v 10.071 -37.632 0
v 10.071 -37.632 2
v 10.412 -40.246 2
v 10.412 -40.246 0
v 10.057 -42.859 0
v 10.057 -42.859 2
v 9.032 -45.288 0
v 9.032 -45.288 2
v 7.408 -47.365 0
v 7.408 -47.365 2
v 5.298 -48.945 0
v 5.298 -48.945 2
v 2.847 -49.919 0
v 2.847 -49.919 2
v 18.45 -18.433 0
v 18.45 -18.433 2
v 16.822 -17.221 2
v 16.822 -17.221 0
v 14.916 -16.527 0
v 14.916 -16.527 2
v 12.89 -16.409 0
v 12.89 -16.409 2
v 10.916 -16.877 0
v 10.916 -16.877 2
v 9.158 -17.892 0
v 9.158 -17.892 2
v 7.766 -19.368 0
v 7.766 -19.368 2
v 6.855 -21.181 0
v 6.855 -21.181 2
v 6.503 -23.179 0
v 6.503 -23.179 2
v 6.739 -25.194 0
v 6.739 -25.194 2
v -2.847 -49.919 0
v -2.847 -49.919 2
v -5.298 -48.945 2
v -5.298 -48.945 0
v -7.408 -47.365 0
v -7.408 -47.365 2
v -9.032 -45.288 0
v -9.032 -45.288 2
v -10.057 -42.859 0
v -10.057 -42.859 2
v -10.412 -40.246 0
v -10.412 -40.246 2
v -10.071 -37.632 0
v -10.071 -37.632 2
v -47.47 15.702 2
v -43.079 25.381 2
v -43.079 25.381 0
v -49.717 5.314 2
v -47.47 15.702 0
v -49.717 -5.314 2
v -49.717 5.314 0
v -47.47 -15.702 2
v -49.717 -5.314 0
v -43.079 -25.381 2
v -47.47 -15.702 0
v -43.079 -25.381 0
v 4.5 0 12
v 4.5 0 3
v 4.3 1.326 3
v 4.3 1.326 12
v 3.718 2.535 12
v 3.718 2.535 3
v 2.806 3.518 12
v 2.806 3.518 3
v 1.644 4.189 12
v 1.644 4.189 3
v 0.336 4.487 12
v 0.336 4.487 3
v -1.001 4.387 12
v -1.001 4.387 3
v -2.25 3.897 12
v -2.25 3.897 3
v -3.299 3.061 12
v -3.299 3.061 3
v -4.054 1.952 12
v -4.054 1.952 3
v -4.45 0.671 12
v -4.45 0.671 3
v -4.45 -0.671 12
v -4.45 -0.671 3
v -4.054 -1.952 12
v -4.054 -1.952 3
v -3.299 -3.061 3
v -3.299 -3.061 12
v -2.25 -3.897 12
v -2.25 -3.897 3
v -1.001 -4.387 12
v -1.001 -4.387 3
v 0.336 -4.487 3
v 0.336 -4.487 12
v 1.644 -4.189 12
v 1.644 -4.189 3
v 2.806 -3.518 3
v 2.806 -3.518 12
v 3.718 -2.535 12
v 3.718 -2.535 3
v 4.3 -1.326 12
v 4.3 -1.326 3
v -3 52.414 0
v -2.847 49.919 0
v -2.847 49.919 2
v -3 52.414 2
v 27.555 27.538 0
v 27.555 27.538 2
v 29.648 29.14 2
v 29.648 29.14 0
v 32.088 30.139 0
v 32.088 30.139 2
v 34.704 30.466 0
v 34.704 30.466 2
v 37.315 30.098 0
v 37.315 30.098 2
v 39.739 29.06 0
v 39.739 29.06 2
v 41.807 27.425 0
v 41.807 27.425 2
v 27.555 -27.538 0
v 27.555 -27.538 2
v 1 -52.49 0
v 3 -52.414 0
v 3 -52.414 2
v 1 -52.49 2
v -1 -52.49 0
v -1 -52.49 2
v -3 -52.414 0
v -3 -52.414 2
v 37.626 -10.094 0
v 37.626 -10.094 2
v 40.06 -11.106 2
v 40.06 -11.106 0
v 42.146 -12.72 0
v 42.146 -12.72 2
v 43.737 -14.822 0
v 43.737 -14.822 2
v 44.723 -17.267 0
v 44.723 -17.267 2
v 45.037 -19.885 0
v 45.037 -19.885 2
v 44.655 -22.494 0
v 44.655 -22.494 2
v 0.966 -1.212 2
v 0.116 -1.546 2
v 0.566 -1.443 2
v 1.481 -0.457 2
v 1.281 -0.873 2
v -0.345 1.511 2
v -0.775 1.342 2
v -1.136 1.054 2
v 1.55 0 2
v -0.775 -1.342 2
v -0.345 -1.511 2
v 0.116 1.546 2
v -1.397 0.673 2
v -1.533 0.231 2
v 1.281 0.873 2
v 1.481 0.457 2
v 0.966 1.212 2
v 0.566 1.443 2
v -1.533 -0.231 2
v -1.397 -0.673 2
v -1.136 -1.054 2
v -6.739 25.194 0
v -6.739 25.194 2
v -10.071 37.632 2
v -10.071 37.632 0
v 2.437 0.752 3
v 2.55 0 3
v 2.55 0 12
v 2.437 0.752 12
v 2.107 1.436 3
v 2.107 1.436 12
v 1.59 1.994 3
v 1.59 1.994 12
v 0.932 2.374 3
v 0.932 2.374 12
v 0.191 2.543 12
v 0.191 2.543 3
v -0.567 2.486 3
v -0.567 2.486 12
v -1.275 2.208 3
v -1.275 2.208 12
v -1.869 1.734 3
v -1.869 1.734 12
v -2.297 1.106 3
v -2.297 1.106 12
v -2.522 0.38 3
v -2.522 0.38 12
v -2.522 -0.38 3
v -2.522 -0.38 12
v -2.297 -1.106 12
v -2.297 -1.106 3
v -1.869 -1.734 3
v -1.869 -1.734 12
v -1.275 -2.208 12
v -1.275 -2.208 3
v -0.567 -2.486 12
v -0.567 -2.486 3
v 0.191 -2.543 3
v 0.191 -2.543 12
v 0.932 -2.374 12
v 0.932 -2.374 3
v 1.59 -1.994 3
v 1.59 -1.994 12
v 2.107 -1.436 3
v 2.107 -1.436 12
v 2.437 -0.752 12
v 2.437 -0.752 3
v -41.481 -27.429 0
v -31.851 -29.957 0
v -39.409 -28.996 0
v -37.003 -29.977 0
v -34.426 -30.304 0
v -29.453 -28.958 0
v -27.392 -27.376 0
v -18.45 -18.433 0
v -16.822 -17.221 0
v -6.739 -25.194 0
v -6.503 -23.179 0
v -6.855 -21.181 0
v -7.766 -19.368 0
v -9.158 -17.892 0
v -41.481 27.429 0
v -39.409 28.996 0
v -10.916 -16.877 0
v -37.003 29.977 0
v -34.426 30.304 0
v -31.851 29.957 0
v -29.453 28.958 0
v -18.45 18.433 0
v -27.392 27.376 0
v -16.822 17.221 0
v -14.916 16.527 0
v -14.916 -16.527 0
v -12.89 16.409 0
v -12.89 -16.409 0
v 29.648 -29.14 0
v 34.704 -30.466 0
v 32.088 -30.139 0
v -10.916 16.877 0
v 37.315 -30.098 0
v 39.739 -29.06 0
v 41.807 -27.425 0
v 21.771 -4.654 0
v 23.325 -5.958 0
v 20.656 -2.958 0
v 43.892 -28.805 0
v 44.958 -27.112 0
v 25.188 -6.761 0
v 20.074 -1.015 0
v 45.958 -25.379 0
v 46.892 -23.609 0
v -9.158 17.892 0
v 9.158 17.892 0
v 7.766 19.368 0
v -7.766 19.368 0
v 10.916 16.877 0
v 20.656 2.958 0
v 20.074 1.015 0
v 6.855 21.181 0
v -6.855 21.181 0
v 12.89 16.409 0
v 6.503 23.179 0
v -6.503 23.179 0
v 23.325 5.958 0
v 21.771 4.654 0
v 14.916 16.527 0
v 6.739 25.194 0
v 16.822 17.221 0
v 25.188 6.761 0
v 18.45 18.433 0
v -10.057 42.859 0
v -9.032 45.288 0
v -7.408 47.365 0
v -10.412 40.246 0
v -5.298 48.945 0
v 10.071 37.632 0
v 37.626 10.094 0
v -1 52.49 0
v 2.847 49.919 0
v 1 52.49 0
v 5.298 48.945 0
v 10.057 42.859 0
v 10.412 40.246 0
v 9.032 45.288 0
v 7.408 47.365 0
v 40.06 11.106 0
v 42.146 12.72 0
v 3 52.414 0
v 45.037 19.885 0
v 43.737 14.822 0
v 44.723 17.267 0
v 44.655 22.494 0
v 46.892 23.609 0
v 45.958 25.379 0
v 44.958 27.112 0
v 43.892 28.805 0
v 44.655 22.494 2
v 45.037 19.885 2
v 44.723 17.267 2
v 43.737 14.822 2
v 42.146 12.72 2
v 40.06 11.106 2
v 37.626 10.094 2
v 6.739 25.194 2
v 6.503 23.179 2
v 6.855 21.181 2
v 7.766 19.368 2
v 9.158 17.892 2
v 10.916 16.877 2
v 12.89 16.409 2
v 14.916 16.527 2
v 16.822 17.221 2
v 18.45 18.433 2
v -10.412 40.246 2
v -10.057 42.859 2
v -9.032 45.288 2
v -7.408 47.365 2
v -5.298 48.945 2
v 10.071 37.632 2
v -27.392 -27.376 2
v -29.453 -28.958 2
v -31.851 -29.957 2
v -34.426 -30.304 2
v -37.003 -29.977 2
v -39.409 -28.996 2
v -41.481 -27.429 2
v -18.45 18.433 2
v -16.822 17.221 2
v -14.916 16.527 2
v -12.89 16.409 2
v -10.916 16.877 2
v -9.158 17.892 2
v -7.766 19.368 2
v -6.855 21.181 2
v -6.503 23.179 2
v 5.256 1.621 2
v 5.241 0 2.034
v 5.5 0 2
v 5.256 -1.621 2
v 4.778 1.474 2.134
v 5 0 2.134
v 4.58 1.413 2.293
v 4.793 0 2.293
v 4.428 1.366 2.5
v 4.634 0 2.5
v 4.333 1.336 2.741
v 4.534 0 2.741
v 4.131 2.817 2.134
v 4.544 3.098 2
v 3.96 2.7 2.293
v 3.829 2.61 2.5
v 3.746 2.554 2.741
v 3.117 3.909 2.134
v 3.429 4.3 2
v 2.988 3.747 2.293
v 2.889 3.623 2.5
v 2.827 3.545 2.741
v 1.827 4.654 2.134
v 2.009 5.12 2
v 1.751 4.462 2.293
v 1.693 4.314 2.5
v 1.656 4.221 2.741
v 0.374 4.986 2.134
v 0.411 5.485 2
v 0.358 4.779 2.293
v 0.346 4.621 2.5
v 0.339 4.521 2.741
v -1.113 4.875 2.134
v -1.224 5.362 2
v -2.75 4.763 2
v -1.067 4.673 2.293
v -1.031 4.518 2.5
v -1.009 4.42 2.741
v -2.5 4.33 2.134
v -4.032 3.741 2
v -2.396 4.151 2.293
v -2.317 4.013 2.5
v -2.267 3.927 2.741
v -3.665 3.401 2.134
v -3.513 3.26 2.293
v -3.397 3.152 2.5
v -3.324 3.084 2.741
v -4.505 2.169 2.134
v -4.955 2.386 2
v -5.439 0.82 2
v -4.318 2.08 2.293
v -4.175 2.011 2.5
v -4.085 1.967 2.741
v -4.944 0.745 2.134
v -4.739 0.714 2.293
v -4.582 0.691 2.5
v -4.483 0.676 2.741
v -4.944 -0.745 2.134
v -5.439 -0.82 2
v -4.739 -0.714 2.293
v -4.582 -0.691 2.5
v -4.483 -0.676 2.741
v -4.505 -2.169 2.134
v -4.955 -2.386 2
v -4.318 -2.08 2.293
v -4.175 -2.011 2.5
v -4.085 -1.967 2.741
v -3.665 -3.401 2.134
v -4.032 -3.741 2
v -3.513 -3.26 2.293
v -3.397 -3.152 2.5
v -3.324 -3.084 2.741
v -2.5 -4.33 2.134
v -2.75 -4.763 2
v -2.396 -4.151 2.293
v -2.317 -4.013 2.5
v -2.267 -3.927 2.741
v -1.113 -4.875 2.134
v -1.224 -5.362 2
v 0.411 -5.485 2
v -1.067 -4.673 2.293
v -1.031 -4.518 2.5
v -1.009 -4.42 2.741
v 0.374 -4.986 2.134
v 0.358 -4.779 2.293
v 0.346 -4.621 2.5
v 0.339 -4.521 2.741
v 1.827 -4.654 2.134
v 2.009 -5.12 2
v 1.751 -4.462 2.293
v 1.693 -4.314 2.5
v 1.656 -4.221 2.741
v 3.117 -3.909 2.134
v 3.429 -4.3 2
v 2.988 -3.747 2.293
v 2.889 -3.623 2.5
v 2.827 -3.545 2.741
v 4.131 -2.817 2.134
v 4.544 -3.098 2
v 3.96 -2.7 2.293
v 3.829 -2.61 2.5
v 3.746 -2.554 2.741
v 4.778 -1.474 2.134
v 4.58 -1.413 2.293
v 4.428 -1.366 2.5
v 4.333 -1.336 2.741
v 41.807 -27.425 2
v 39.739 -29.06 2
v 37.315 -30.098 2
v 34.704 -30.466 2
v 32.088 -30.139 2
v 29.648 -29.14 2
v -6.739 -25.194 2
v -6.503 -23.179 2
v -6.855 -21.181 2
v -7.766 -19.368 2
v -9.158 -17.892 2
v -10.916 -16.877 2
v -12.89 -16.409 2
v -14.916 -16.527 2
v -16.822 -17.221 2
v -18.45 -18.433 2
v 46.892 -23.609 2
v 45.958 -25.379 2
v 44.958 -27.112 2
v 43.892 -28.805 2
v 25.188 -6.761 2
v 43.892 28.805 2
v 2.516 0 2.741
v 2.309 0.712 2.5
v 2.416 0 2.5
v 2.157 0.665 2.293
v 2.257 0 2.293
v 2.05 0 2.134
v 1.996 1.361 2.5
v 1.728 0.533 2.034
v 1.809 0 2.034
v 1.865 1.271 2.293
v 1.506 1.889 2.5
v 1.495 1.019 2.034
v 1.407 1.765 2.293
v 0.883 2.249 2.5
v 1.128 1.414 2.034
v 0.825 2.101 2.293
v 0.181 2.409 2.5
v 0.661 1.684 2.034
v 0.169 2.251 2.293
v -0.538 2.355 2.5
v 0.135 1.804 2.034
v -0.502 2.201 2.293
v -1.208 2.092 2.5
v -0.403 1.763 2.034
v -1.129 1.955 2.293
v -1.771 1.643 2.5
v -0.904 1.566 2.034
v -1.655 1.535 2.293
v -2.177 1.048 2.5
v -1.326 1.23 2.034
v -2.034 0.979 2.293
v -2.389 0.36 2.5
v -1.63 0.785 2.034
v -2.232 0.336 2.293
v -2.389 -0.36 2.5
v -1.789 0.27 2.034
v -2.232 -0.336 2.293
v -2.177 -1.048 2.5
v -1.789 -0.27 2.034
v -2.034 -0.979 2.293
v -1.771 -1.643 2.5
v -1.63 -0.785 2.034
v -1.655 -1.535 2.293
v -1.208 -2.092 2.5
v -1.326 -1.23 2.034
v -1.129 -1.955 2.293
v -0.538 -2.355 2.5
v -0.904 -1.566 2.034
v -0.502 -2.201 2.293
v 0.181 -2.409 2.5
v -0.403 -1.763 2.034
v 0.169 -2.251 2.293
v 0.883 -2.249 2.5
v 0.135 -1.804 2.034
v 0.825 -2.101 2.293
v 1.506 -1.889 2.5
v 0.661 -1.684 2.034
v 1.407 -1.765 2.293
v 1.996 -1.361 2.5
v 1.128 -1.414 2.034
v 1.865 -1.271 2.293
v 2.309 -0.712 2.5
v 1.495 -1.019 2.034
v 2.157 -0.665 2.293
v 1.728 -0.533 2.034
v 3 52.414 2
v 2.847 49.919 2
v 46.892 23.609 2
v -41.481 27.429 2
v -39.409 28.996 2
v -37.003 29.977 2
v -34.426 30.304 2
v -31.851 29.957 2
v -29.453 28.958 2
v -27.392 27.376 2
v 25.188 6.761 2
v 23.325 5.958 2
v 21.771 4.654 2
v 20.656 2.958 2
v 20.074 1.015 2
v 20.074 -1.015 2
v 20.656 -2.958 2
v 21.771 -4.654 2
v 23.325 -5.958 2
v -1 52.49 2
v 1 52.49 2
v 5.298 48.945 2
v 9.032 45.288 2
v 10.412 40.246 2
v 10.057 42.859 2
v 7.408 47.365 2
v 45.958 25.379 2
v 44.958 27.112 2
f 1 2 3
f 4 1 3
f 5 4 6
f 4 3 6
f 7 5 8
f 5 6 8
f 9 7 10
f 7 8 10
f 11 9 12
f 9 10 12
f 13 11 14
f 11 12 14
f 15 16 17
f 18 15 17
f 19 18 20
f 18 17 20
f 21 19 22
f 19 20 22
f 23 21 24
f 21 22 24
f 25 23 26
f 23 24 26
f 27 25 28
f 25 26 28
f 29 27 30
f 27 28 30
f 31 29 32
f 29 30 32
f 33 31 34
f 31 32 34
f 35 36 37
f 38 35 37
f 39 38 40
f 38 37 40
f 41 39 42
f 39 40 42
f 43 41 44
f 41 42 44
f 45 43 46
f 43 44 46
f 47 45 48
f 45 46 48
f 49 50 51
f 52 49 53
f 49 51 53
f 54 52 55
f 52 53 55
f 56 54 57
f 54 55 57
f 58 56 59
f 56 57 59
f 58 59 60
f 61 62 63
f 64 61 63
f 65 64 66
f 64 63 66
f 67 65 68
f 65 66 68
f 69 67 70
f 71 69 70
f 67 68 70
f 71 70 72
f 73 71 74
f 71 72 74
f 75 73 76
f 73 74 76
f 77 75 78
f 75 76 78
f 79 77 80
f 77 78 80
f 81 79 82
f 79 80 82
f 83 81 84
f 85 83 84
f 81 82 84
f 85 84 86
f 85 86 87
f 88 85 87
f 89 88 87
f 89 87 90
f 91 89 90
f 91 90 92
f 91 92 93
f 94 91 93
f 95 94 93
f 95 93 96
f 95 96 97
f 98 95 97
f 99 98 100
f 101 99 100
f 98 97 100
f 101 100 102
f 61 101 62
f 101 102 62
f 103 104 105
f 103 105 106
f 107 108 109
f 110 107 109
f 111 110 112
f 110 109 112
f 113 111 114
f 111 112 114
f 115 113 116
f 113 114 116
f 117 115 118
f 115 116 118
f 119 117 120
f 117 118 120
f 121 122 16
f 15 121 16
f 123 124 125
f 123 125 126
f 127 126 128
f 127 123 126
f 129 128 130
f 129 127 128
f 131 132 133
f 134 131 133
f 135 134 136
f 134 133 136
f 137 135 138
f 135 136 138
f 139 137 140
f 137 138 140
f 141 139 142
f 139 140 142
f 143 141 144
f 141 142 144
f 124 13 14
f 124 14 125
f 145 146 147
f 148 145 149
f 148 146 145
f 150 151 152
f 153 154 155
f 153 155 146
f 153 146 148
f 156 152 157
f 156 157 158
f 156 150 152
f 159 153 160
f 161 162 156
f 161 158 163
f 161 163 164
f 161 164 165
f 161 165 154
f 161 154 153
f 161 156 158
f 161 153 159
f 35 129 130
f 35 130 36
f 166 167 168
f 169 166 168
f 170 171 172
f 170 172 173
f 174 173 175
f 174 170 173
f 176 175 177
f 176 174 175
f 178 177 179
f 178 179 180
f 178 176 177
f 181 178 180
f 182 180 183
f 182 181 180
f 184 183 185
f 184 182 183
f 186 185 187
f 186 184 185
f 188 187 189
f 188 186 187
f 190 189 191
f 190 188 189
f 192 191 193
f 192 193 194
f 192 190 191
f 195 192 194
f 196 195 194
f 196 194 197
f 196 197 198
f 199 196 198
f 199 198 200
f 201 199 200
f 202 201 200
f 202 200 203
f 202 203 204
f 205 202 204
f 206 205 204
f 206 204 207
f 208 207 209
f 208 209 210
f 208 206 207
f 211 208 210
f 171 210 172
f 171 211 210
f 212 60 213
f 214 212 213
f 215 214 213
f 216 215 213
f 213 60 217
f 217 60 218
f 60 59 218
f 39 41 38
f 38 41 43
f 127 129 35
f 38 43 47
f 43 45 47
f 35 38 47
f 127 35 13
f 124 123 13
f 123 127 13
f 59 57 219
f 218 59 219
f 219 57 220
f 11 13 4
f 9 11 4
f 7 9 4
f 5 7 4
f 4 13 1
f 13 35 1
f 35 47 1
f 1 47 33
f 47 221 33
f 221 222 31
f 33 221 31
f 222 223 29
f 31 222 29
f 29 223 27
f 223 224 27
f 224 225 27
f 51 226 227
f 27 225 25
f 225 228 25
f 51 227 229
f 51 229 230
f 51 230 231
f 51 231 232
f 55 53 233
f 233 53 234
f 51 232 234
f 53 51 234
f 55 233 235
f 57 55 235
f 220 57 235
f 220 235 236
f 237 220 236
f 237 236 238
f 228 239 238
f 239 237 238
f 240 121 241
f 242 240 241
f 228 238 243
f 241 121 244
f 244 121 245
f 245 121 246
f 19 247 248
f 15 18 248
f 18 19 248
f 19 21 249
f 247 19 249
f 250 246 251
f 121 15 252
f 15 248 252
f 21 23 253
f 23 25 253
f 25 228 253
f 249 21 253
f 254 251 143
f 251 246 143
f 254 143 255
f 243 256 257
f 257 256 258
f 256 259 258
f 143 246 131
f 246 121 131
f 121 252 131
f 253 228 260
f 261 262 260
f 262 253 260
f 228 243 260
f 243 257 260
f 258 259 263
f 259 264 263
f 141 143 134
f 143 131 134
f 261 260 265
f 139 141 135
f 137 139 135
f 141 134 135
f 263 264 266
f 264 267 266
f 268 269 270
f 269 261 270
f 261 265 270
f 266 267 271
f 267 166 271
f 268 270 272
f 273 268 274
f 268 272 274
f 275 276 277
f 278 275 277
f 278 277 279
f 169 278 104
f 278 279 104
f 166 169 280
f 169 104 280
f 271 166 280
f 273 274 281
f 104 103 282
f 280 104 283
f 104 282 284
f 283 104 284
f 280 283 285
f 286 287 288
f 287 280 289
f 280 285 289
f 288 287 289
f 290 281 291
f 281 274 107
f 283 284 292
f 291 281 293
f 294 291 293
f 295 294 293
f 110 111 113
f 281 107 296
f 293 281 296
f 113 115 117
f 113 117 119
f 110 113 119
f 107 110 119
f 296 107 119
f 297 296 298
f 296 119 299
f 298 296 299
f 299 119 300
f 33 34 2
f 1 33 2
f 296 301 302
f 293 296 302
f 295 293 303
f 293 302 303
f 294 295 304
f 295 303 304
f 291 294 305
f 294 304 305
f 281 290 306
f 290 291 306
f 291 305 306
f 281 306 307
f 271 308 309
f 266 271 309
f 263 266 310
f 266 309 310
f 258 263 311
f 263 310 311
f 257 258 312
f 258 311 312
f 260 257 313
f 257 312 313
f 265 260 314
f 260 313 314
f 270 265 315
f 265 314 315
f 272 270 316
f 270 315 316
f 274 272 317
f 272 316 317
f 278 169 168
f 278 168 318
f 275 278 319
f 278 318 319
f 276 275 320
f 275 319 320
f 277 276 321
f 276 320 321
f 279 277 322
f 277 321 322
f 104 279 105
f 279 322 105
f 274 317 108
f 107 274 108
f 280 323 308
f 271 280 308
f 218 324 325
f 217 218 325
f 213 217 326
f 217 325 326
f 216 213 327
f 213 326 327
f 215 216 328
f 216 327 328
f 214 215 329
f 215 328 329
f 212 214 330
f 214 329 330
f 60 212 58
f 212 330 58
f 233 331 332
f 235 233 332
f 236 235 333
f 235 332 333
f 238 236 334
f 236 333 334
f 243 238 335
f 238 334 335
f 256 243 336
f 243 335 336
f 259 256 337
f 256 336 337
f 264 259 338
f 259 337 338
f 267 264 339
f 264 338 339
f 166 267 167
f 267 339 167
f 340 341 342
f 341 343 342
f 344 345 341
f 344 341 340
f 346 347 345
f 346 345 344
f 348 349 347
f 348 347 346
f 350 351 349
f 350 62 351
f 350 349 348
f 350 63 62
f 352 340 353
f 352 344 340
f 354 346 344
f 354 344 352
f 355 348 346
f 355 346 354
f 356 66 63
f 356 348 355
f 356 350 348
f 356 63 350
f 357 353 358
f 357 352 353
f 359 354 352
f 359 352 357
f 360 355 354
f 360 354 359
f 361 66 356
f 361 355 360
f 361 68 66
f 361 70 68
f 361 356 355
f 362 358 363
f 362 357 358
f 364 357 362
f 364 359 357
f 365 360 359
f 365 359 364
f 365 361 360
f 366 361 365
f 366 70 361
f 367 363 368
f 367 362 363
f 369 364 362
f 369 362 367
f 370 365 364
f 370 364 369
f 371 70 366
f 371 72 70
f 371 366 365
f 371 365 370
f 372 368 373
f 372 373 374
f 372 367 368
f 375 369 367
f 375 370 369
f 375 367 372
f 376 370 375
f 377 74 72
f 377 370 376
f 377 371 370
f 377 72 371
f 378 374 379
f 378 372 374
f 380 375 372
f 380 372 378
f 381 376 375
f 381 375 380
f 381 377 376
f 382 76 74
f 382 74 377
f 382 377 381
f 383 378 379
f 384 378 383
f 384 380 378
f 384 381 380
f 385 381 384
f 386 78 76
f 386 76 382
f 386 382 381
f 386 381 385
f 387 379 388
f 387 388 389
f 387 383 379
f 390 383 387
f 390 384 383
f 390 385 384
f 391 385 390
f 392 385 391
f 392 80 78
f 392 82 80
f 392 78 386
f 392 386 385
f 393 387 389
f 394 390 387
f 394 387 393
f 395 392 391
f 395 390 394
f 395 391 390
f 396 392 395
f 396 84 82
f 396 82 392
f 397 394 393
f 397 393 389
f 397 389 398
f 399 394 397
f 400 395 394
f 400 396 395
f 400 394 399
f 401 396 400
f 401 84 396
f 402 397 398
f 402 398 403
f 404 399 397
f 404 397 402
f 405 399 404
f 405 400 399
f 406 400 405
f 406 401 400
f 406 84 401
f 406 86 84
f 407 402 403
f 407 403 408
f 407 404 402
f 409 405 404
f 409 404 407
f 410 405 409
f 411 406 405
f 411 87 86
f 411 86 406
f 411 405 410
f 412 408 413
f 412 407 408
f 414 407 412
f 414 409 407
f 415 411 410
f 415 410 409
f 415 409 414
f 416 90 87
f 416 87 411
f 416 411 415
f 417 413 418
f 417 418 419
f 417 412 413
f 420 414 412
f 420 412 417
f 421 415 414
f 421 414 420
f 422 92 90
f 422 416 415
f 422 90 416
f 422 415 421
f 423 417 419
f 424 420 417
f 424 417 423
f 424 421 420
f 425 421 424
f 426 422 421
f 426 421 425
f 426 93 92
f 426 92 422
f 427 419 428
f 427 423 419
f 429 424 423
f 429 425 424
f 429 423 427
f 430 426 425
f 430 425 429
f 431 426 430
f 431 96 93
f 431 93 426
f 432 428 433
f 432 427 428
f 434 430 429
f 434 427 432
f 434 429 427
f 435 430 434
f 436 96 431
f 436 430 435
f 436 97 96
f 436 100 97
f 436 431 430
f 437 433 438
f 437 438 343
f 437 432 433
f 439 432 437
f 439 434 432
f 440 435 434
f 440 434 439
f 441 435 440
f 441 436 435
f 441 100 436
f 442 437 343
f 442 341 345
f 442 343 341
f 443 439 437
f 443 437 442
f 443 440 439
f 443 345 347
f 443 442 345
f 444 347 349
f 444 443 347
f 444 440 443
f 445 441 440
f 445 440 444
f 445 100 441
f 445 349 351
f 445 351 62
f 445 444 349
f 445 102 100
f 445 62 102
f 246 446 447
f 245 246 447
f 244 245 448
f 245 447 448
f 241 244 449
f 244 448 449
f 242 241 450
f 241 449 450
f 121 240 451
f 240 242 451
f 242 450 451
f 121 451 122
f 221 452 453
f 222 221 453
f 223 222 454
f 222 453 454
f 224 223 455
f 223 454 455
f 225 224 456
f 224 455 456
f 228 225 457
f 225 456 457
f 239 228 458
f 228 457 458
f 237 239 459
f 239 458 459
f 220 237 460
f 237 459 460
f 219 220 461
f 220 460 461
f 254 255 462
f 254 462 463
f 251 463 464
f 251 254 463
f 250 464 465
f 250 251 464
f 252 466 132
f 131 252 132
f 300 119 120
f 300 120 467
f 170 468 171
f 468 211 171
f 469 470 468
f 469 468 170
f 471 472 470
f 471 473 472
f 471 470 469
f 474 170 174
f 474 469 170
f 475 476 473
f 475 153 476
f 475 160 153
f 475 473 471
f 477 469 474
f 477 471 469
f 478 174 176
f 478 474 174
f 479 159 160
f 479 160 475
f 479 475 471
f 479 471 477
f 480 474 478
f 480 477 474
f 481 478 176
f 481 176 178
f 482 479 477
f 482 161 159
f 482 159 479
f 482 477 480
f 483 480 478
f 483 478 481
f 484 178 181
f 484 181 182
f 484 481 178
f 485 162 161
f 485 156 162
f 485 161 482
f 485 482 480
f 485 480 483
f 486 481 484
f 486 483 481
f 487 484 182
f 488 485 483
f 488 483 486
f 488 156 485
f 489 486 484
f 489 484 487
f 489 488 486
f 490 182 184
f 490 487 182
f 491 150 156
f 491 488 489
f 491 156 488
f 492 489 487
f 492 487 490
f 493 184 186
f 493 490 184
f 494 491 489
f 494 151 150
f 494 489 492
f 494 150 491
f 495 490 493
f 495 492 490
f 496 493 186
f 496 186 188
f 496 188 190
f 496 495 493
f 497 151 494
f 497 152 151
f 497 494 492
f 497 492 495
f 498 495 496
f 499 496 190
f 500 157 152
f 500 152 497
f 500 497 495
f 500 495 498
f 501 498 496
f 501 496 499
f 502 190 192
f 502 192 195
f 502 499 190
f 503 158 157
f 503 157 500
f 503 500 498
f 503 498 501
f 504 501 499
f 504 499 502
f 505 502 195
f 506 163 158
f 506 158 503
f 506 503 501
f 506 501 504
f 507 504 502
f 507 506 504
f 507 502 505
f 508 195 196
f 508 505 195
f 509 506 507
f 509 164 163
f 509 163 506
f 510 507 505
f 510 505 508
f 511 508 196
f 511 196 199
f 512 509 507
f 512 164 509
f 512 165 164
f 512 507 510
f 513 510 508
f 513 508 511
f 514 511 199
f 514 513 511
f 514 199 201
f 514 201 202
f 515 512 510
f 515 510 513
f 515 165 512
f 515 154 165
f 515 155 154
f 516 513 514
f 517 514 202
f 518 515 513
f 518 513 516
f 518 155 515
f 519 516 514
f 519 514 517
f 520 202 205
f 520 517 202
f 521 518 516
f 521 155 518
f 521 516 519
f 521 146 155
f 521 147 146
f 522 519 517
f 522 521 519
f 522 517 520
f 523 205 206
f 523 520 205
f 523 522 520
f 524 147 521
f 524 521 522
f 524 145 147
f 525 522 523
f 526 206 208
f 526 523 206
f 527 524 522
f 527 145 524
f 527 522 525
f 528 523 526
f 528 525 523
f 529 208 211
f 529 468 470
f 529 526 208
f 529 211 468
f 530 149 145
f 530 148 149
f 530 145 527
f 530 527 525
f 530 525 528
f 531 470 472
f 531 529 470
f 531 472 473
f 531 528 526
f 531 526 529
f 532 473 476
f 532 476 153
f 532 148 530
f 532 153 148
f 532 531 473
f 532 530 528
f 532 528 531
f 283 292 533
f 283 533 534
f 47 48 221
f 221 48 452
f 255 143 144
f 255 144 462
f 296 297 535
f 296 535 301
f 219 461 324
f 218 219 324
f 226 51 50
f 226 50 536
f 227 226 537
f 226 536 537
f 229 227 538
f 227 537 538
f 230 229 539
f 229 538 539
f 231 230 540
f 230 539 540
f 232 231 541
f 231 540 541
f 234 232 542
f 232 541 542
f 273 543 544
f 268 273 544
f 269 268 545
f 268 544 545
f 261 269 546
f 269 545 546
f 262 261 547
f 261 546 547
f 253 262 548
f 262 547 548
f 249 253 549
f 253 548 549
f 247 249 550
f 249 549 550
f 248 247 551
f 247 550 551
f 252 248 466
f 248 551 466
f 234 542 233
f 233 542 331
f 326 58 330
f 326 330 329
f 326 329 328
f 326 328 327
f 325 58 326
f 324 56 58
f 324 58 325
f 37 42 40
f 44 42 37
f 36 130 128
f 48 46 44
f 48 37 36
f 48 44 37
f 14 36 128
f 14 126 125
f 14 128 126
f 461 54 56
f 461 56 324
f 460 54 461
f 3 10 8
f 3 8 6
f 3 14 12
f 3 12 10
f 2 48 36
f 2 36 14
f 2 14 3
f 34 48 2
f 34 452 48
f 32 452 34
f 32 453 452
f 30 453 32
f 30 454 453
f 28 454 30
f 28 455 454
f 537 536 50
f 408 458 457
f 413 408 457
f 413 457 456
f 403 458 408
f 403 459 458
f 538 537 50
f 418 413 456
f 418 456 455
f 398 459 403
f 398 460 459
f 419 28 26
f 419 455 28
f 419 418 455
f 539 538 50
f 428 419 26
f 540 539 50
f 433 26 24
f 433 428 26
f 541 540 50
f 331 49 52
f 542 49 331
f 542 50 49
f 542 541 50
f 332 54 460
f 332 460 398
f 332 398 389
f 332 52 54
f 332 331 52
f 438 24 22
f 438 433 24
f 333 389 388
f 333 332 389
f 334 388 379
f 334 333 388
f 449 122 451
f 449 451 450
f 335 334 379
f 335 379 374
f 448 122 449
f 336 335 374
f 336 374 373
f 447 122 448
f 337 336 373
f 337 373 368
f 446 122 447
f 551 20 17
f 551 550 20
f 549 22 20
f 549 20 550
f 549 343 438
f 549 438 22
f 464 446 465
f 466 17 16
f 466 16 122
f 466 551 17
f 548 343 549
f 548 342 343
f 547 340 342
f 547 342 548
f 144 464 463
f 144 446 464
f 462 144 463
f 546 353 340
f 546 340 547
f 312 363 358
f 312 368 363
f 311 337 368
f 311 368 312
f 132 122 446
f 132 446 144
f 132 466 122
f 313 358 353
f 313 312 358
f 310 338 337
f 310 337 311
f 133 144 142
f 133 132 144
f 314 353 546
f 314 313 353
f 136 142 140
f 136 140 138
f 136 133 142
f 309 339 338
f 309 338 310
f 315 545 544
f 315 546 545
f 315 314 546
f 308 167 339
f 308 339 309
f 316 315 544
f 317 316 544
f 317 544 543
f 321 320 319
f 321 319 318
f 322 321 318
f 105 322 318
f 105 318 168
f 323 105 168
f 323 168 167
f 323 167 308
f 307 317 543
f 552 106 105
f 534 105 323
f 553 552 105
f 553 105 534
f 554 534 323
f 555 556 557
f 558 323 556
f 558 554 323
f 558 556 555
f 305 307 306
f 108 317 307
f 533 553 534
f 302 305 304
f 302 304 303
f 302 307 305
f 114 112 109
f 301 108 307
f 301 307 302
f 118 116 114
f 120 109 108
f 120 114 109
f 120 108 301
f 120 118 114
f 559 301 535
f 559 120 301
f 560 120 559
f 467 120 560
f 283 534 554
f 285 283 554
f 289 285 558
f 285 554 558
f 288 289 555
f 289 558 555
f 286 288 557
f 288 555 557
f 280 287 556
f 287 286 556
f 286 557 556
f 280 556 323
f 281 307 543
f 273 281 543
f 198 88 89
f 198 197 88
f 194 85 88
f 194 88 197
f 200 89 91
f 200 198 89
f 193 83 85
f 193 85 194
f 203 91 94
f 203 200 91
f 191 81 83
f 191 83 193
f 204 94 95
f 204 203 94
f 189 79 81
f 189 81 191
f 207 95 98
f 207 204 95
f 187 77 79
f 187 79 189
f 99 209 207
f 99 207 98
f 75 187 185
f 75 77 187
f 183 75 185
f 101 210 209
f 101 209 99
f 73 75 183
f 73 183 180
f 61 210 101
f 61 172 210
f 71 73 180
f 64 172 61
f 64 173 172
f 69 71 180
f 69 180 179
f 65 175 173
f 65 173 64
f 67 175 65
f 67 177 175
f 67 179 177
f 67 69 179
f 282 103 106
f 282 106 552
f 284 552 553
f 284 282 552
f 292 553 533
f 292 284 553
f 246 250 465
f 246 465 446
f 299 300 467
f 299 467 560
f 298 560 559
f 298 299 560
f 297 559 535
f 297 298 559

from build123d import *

# Parameters (mm, degrees)
SKETCH1_R                       = 50
BOSS_EXTRUDE1_DEPTH             = 2
BOSS_EXTRUDE3_START             = -2
BOSS_EXTRUDE3_DEPTH             = 2
SKETCH4_R                       = 4.5
SKETCH4_R_2                     = 2.55
BOSS_EXTRUDE2_DEPTH             = 10
CIRPATTERN2_COUNT               = 4
CIRPATTERN2_ANGLE               = 180
CUT_EXTRUDE2_REACH              = 75.186
CIRPATTERN3_COUNT               = 3
CIRPATTERN3_ANGLE               = 120
CIRPATTERN3_THE_OTHER_WAY_COUNT = 3
CIRPATTERN3_THE_OTHER_WAY_ANGLE = 120
FILLET1_R                       = 10
FILLET2_R                       = 1


with BuildPart() as part:
    # Sketch1 → Boss-Extrude1 (new body)
    with BuildSketch(Plane.XY):
        Circle(SKETCH1_R)
    extrude(amount=BOSS_EXTRUDE1_DEPTH)

    # Sketch5 → Boss-Extrude3 (add)
    with BuildSketch(Plane.XY.offset(2).offset(BOSS_EXTRUDE3_START)):
        with BuildLine():
            Line((-2.847377425, 49.918858579), (-3, 52.414215629))
            ThreePointArc((-3, 52.414215629), (0, 52.5), (3, 52.414215629))
            Line((3, 52.414215629), (2.847377425, 49.918858579))
            ThreePointArc((2.847377425, 49.918858579), (0, 50), (-2.847377425, 49.918858579))
        make_face()
    boss_extrude3 = extrude(amount=BOSS_EXTRUDE3_DEPTH)

    # Sketch4 → Boss-Extrude2 (add)
    with BuildSketch(Plane.XY.offset(2)):
        Circle(SKETCH4_R)
        Circle(SKETCH4_R_2, mode=Mode.SUBTRACT)
    extrude(amount=BOSS_EXTRUDE2_DEPTH)

    # CirPattern2: Boss-Extrude3 ×4 about axis
    cirpattern2_axis = Axis((0, 0, 0), (0, 0, -1))
    for i in range(1, CIRPATTERN2_COUNT):
        add(boss_extrude3.rotate(cirpattern2_axis, i * CIRPATTERN2_ANGLE / (CIRPATTERN2_COUNT - 1)))

    # Sketch7 → Cut-Extrude2 (cut, up to next)
    with BuildSketch(Plane.XY.offset(2), mode=Mode.PRIVATE) as cut_extrude2_sk1:
        with BuildLine():
            Line((48.293213683, 12.952432674), (25.188266684, 6.761480784))
            ThreePointArc((25.188266684, 6.761480784), (20, 0), (25.188266684, -6.761480784))
            Line((25.188266684, -6.761480784), (48.293213683, -12.952432674))
            ThreePointArc((48.293213683, -12.952432674), (50, 0), (48.293213683, 12.952432674))
        make_face()
    cut_extrude2_tool1 = extrude(cut_extrude2_sk1.sketch, amount=-CUT_EXTRUDE2_REACH, mode=Mode.PRIVATE) & part.part
    cut_extrude2 = cut_extrude2_tool1.solids().sort_by_distance((37.115477, 0, 2))[0]
    add(cut_extrude2, mode=Mode.SUBTRACT)

    # CirPattern3: Cut-Extrude2 ×3 about axis
    cirpattern3_axis = Axis((0, 0, 0), (0, 0, 1))
    for i in range(1, CIRPATTERN3_COUNT):
        add(cut_extrude2.rotate(cirpattern3_axis, i * CIRPATTERN3_ANGLE / (CIRPATTERN3_COUNT - 1)), mode=Mode.SUBTRACT)

    # CirPattern3 the other way: Cut-Extrude2 ×3 about axis
    cirpattern3_the_other_way_axis = Axis((0, 0, 0), (0, 0, -1))
    for i in range(1, CIRPATTERN3_THE_OTHER_WAY_COUNT):
        add(cut_extrude2.rotate(cirpattern3_the_other_way_axis, i * CIRPATTERN3_THE_OTHER_WAY_ANGLE / (CIRPATTERN3_THE_OTHER_WAY_COUNT - 1)), mode=Mode.SUBTRACT)

    # Fillet1
    # the kernel refuses this fillet: 10 mm, written as the material it takes off along each edge
    with BuildSketch(Plane(origin=(-35.363742578, 35.346933543, 33.509652434), x_dir=(-0.6121571340688006, -0.7907361400673886, 0), z_dir=(0, 0, -1))) as fillet1_piece_1:
        with BuildLine():
            CenterArc((11.343474876, -9.920253368), FILLET1_R, 82.759261871, 104.49509636)
            Line((1.423521402, -11.182997629), (1.225122333, -11.208252514))
            Line((1.225122333, -11.208252514), (-0.198399069, -0.025254885))
            Line((-0.198399069, -0.025254885), (-0.025207722, 0.198405067))
            ThreePointArc((-0.025207722, 0.198405067), (6.301930487, 0.59873316), (12.629068696, 0.198405067))
            Line((12.629068696, 0.198405067), (12.603860974, 0))
        make_face()
    extrude(amount=65.019304869, mode=Mode.SUBTRACT)
    with BuildSketch(Plane(origin=(-12.929471105, 48.299366217, 29.609711649), x_dir=(0.9873433189599674, 0.15859751103064706, 0), z_dir=(0, 0, -1))) as fillet1_piece_2:
        with BuildLine():
            CenterArc((11.077824317, 9.96238911), FILLET1_R, 174.125500121, 90.903649981)
            Line((1.130339641, 10.985887341), (0.931389948, 11.006357306))
            Line((0.931389948, 11.006357306), (-0.198949694, 0.020469965))
            Line((-0.198949694, 0.020469965), (-0.020422671, -0.198954554))
            ThreePointArc((-0.020422671, -0.198954554), (5.105667647, -0.46136152), (10.194005514, -0.199247782))
            Line((10.194005514, -0.199247782), (10.211335295, 0))
        make_face()
    extrude(amount=57.219423297, mode=Mode.SUBTRACT)
    with BuildSketch(Plane(origin=(35.363742578, -35.346933543, 29.609711649), x_dir=(0.6310211330095078, 0.775765640960849, 0), z_dir=(0, 0, -1)), Plane(origin=(-12.929471105, -48.299366217, 29.609711649), x_dir=(0.9873433189599667, -0.1585975110306507, 0), z_dir=(0, 0, -1)), Plane(origin=(12.929471105, 48.299366217, 29.609711649), x_dir=(-0.987343318959968, 0.15859751103064254, 0), z_dir=(0, 0, -1)), Plane(origin=(48.293213683, 12.952432674, 29.609711649), x_dir=(-0.35632218595046244, 0.9343631519914962, 0), z_dir=(0, 0, -1))) as fillet1_piece_3:
        with BuildLine():
            CenterArc((11.077824317, -9.96238911), FILLET1_R, 94.970849897, 90.903649981)
            Line((1.130339641, -10.985887341), (0.931389948, -11.006357306))
            Line((0.931389948, -11.006357306), (-0.198949694, -0.020469965))
            Line((-0.198949694, -0.020469965), (-0.020422671, 0.198954554))
            ThreePointArc((-0.020422671, 0.198954554), (5.105667647, 0.46136152), (10.194005514, 0.199247782))
            Line((10.194005514, 0.199247782), (10.211335295, 0))
        make_face()
    extrude(amount=57.219423297, mode=Mode.SUBTRACT)
    with BuildSketch(Plane(origin=(12.929471105, -48.299366217, 29.609711649), x_dir=(-0.2588190451025242, 0.9659258262890674, 0), z_dir=(0, 0, -1)), Plane(origin=(35.363742578, 35.346933543, 29.609711649), x_dir=(-0.7071067811865411, -0.707106781186554, 0), z_dir=(0, 0, -1)), Plane(origin=(48.293213683, -12.952432674, 29.609711649), x_dir=(-0.96592582628907, 0.2588190451025145, 0), z_dir=(0, 0, -1))) as fillet1_piece_4:
        with BuildLine():
            CenterArc((11.043884659, -10), FILLET1_R, 90, 90.903649981)
            Line((1.045128361, -10.157710136), (0.845153235, -10.160864339))
            ThreePointArc((0.845153235, -10.160864339), (0.063625516, -5.126075338), (-0.199999994, -4.7543e-05))
            Line((-0.199999994, -4.7543e-05), (0, 0.2))
            Line((0, 0.2), (11.043884659, 0.2))
            Line((11.043884659, 0.2), (11.043884659, 0))
        make_face()
    extrude(amount=57.219423297, mode=Mode.SUBTRACT)
    with BuildSketch(Plane(origin=(-35.363742578, -35.346933543, 33.509652434), x_dir=(0.7071067811865469, 0.7071067811865481, 0), z_dir=(0, 0, -1))) as fillet1_piece_5:
        with BuildLine():
            CenterArc((11.273235967, -10), FILLET1_R, 90, 104.49509636)
            Line((1.591545311, -12.502971446), (1.397911498, -12.553030874))
            ThreePointArc((1.397911498, -12.553030874), (0.201832147, -6.327090409), (-0.199999994, -4.7543e-05))
            Line((-0.199999994, -4.7543e-05), (0, 0.2))
            Line((0, 0.2), (11.273235967, 0.2))
            Line((11.273235967, 0.2), (11.273235967, 0))
        make_face()
    extrude(amount=65.019304869, mode=Mode.SUBTRACT)

    # Fillet2
    fillet2_edges = [part.edges().sort_by_distance(p)[0] for p in [
        (-2.55, 0, 2),
        (-4.5, 0, 2),
    ]]
    fillet(fillet2_edges, radius=FILLET2_R)


solid = part.part
